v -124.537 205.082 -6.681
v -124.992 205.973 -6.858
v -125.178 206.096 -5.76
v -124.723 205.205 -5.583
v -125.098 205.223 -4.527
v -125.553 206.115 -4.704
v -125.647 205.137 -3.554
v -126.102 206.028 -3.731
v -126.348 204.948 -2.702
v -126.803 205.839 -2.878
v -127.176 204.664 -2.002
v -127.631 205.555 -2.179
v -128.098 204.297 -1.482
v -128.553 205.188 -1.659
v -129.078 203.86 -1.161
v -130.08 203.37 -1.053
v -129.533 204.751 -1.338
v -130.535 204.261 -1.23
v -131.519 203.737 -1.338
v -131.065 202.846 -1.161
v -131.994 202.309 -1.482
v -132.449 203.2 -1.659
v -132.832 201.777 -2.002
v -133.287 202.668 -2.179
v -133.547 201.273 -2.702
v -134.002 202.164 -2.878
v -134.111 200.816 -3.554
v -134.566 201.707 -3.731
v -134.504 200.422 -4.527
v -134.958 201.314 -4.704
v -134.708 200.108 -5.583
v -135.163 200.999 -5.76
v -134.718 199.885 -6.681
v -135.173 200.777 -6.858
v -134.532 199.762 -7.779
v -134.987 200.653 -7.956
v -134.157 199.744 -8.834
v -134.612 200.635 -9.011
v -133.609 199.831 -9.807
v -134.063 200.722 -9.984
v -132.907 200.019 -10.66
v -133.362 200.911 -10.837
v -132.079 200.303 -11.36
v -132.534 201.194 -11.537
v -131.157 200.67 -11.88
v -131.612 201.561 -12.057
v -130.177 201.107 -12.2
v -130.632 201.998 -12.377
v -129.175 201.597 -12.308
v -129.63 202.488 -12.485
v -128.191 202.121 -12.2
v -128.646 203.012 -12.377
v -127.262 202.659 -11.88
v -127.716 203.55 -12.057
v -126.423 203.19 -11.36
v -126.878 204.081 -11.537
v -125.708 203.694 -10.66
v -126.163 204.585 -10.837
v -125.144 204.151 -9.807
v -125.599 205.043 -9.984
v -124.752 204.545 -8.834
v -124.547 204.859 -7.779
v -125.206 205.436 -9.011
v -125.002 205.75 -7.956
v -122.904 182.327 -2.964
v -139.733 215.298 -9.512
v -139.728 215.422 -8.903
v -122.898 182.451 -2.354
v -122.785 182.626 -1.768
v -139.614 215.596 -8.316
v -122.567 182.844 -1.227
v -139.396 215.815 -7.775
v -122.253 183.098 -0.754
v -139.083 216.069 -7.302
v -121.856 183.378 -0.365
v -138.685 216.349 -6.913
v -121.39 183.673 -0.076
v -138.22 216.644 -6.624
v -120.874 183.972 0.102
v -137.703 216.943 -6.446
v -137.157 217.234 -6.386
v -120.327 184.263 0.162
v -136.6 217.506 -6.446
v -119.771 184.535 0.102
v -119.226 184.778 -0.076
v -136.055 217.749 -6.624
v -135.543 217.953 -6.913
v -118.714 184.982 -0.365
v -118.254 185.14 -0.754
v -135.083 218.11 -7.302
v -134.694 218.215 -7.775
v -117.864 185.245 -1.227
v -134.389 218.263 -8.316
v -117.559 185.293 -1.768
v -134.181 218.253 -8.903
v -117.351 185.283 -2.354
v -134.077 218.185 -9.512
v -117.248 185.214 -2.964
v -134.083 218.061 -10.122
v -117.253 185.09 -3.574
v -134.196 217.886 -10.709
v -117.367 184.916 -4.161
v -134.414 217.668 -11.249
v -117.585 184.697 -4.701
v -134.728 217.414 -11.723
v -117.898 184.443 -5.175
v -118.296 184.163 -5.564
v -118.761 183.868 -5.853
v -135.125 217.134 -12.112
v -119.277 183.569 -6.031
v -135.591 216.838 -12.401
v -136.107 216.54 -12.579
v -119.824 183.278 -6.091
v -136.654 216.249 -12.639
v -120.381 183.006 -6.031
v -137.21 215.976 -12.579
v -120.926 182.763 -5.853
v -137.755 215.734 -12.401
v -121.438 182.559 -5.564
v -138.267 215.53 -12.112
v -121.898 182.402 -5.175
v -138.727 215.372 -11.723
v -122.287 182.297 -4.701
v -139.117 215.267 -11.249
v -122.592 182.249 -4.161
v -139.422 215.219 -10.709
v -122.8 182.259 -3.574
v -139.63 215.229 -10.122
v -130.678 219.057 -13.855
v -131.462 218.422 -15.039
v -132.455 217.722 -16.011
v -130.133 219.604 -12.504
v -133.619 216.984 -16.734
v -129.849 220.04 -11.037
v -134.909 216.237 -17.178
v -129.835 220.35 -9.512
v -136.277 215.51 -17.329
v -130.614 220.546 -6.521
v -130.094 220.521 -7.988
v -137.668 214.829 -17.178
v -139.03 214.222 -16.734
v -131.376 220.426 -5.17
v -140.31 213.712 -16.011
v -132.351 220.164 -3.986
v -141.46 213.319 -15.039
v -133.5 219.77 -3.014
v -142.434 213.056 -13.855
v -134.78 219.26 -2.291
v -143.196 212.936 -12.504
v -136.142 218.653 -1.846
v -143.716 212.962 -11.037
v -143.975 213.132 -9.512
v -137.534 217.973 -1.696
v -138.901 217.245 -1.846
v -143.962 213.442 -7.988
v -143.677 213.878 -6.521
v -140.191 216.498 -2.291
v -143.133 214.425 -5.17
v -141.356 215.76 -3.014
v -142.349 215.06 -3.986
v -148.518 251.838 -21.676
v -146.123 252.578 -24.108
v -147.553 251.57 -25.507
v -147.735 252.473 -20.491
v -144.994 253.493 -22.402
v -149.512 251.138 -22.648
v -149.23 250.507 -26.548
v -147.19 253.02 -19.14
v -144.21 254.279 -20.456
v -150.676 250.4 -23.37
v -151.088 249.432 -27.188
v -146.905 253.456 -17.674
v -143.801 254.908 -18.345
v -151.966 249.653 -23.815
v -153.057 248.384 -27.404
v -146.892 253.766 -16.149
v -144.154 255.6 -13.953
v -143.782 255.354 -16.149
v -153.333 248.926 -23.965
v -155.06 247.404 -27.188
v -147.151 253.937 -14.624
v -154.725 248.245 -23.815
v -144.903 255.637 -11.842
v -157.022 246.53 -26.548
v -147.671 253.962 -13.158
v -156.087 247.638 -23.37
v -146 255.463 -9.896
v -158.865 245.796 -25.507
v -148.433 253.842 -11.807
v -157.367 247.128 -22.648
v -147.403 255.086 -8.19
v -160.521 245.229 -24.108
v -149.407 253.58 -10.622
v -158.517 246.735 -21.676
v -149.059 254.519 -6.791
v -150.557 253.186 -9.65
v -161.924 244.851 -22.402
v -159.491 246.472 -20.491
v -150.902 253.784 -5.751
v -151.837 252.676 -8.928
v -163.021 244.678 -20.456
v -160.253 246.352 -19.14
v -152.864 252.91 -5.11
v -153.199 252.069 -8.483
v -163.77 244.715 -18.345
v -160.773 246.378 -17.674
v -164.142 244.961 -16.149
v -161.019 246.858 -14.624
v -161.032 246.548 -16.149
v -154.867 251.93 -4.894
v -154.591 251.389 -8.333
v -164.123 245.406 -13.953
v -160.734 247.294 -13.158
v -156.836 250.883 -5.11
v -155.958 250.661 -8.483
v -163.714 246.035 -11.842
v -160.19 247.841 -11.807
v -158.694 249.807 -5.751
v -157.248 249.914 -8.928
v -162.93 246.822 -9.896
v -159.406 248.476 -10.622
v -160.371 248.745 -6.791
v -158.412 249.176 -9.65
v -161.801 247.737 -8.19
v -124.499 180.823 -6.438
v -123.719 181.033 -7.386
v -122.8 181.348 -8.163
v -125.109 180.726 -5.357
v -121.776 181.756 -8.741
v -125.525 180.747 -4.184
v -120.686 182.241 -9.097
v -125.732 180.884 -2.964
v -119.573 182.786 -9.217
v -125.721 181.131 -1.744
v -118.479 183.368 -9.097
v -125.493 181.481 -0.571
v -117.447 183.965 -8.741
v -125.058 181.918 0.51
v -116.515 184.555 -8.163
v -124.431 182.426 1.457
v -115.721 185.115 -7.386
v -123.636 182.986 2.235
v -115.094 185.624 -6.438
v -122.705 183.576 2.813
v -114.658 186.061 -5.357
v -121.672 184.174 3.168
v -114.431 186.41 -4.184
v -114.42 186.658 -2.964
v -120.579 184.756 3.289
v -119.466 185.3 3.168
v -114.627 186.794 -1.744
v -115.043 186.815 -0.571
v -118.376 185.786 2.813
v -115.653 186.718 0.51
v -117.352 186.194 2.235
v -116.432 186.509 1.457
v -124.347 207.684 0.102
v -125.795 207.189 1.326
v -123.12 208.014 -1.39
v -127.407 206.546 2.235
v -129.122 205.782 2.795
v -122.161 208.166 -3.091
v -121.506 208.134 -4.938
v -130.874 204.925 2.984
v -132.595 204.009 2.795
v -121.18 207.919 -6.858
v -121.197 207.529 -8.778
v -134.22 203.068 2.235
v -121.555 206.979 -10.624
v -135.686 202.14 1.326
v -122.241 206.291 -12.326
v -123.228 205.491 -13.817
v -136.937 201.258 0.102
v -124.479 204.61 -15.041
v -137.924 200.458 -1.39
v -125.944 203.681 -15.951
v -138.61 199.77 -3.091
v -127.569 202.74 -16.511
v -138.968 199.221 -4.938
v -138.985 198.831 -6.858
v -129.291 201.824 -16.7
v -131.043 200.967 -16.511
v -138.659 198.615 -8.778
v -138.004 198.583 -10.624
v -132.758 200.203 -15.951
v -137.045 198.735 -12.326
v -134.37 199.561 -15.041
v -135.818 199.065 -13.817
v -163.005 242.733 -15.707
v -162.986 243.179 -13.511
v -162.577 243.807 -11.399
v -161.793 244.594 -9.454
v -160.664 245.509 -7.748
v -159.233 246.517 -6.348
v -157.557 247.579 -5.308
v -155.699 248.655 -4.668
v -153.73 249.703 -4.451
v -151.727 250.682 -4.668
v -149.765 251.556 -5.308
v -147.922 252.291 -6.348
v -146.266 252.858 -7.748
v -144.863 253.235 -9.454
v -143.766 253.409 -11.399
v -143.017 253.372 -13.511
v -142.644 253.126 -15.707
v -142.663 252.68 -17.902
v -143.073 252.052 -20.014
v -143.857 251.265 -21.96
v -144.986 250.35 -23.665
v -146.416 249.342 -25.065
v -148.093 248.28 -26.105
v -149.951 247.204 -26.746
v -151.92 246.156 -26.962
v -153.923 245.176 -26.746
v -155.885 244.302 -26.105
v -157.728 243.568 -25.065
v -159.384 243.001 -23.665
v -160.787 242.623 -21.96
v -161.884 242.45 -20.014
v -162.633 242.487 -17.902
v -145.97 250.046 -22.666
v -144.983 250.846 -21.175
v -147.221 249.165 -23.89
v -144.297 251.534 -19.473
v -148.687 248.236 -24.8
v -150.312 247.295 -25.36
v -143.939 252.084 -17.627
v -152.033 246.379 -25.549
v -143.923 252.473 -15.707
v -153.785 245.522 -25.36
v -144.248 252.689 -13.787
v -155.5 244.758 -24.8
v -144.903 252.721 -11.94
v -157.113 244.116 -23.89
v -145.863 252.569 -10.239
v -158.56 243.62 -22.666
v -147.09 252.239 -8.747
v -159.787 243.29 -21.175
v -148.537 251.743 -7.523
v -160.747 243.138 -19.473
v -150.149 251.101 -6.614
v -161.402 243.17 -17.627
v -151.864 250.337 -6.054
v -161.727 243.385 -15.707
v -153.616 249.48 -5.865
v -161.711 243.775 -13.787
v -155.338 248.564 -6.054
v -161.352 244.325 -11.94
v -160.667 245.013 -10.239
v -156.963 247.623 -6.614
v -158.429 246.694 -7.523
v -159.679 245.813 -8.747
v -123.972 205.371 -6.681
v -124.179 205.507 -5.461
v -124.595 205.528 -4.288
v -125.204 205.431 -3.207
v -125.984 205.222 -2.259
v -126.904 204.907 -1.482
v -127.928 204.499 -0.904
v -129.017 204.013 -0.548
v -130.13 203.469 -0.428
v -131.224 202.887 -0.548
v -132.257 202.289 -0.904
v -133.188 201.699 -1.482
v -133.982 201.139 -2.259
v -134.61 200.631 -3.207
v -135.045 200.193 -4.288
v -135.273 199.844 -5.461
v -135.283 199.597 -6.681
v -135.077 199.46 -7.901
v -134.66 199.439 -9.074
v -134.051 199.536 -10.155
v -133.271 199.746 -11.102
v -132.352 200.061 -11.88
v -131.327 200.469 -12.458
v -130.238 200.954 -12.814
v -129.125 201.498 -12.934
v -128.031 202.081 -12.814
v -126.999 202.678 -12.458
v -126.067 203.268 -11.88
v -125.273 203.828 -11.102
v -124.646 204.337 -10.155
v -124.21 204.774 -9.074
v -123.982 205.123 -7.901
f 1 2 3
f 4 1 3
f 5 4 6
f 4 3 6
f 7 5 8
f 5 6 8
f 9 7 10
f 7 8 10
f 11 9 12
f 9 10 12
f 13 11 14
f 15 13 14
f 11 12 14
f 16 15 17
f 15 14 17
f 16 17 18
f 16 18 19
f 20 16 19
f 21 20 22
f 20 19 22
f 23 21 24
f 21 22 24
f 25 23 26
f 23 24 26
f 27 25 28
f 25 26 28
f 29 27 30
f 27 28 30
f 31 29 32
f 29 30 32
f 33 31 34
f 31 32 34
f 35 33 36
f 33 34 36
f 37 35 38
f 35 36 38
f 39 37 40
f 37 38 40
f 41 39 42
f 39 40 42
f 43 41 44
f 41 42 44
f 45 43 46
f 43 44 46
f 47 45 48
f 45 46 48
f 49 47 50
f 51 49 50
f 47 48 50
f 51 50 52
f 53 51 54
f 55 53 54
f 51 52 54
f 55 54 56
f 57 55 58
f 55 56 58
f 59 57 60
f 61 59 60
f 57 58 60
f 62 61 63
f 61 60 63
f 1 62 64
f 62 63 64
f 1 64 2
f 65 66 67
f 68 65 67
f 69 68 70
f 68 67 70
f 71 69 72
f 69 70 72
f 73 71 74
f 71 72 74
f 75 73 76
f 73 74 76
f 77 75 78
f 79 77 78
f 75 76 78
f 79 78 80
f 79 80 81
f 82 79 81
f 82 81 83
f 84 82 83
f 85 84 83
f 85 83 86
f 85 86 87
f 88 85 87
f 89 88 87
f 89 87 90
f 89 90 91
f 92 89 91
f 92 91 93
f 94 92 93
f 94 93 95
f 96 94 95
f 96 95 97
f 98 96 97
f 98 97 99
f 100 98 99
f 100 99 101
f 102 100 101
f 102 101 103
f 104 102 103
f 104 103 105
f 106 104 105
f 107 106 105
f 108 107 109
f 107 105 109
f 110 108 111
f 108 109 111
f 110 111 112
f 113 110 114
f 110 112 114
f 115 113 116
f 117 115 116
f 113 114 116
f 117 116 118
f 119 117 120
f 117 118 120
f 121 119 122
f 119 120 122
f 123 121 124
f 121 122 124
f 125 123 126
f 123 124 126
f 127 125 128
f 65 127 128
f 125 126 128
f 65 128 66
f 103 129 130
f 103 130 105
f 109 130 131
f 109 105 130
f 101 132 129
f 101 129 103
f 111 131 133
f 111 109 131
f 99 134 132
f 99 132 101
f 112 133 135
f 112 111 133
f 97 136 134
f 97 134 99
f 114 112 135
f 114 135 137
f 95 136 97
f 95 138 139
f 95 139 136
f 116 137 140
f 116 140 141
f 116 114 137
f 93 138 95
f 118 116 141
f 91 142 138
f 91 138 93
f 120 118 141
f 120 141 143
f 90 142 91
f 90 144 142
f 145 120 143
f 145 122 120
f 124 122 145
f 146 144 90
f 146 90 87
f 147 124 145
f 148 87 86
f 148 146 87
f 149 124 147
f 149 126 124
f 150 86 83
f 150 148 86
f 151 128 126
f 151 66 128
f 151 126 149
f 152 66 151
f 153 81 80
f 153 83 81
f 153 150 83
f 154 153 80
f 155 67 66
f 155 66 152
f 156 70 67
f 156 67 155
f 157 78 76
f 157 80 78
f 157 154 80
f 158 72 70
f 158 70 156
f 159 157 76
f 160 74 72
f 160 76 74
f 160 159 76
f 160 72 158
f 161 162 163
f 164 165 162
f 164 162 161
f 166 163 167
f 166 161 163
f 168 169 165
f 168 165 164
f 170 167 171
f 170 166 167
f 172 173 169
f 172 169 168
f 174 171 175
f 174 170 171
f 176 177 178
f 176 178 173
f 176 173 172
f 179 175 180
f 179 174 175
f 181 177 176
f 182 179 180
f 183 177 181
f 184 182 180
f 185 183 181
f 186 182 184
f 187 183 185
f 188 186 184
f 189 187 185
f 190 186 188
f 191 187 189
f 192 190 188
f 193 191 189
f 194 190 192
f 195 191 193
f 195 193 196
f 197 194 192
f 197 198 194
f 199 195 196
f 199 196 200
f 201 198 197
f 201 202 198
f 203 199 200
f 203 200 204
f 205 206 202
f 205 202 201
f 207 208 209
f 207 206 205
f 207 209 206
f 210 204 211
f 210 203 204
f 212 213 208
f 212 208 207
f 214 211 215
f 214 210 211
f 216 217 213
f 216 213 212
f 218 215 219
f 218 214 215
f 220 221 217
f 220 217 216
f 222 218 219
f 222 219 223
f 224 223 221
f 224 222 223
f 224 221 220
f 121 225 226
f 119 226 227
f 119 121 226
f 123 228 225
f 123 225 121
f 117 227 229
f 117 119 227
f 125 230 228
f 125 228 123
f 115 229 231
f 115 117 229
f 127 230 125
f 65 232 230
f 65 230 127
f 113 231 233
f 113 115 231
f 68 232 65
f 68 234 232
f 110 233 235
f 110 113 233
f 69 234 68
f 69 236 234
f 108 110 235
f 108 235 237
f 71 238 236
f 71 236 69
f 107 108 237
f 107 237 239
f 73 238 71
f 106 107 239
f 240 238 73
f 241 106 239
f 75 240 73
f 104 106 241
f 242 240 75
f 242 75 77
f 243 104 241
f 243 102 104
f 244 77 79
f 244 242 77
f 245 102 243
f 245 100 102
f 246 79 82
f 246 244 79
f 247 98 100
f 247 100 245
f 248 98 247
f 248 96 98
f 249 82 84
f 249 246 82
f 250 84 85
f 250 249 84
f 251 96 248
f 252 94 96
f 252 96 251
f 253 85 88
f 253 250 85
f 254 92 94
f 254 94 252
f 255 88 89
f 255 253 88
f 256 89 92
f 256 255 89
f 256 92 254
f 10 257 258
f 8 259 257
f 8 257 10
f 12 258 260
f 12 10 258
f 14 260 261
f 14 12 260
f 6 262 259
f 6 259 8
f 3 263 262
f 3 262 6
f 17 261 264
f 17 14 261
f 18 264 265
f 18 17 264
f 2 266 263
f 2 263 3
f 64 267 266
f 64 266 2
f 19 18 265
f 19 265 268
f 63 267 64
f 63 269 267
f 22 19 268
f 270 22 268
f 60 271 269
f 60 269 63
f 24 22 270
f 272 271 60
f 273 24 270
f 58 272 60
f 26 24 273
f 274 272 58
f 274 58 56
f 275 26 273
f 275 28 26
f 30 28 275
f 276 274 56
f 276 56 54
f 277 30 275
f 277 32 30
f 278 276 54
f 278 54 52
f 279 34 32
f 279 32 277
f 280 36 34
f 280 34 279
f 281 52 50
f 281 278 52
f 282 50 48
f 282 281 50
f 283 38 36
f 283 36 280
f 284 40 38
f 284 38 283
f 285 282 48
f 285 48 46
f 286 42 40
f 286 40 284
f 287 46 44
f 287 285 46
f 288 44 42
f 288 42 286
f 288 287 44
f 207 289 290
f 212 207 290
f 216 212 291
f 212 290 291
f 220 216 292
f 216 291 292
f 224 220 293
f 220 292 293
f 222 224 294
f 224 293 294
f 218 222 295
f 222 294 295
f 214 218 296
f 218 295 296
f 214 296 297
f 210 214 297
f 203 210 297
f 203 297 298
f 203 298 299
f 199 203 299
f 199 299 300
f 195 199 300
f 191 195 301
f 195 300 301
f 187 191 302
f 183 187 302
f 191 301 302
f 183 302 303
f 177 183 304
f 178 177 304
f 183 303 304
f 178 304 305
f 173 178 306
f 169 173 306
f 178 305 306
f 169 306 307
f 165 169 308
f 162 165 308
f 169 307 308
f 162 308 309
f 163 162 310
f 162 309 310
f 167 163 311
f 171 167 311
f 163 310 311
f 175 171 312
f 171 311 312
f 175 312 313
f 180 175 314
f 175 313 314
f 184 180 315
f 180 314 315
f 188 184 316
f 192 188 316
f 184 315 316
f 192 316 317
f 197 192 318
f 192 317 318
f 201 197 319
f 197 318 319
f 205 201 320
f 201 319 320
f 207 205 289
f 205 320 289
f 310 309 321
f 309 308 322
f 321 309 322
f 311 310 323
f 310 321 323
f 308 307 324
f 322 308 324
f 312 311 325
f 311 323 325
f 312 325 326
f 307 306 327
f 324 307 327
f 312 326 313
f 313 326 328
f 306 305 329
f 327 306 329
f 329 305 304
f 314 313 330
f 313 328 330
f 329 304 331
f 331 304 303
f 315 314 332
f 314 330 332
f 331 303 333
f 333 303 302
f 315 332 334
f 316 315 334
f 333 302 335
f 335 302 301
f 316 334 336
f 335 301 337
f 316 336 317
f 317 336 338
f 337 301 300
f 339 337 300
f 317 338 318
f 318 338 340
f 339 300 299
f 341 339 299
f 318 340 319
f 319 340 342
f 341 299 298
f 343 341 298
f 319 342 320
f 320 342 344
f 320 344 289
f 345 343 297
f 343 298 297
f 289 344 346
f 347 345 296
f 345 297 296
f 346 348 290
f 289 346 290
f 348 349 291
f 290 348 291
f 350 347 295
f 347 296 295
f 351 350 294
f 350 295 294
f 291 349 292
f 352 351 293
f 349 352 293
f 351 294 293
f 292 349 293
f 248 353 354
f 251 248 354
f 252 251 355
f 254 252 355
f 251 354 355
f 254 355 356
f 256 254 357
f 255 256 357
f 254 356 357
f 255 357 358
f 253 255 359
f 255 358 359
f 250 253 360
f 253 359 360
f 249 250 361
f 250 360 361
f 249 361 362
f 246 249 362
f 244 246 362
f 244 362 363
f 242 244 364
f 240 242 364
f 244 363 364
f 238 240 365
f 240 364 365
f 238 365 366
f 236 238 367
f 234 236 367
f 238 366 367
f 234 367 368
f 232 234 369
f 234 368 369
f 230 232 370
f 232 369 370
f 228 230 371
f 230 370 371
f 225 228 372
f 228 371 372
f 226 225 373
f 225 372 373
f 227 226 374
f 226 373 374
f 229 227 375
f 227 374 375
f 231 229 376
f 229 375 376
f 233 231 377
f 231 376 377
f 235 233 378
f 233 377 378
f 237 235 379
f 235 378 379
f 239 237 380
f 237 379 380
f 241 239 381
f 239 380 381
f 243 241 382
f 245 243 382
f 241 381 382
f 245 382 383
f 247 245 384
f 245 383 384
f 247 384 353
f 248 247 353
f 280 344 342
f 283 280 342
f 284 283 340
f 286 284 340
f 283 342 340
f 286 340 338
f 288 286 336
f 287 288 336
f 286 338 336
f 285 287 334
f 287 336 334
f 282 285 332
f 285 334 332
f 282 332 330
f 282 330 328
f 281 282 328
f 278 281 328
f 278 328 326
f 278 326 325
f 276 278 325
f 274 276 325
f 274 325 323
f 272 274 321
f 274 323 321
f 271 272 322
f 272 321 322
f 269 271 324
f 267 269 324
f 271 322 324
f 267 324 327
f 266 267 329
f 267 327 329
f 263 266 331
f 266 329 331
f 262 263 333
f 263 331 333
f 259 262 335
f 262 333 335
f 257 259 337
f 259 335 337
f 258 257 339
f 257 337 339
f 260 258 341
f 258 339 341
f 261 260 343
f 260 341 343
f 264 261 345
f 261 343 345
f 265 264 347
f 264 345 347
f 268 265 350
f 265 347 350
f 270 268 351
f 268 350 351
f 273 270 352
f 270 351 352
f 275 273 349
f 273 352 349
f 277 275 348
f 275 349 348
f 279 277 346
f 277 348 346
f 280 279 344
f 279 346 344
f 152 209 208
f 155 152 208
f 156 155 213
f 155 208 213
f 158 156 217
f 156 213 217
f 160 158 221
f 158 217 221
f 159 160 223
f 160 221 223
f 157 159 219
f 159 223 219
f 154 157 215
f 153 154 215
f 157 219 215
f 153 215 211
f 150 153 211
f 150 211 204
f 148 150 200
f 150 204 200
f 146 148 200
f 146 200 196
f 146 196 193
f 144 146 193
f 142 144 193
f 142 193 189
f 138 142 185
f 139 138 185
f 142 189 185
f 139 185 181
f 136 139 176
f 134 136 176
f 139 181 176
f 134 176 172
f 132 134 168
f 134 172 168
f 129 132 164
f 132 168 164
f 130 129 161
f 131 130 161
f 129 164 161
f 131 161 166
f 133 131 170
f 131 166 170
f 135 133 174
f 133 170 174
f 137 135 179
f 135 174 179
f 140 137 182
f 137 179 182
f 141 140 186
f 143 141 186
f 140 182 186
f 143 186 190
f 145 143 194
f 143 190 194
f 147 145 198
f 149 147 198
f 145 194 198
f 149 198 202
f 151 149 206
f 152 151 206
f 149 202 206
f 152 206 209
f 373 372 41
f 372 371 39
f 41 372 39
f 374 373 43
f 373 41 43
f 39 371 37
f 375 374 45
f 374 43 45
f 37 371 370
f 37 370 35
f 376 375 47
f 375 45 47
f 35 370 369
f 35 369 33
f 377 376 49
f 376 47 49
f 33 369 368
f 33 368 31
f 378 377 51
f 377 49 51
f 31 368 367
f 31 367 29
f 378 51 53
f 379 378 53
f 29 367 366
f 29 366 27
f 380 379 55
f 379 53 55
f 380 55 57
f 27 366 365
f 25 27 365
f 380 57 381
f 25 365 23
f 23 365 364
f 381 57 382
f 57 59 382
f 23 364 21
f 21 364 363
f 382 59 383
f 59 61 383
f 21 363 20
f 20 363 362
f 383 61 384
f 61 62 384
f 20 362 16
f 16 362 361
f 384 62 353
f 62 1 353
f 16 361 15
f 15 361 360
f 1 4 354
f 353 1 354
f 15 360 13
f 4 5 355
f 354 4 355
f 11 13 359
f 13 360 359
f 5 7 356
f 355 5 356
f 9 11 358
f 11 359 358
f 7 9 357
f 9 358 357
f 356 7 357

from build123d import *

# Parameters (mm, degrees)
SKETCH1_R           = 11.43
BOSS_EXTRUDE1_DEPTH = 2.54
SKETCH2_R           = 9.9949
BOSS_EXTRUDE2_DEPTH = 50.8
SKETCH3_R           = 5.715
BOSS_EXTRUDE3_DEPTH = 1.016
SKETCH4_R           = 6.35
BOSS_EXTRUDE4_DEPTH = 21.336
SKETCH5_R           = 3.175
CUT_EXTRUDE1_DEPTH  = 99.13815411
SKETCH6_R           = 7.9375
CUT_EXTRUDE2_DEPTH  = 38.1


with BuildPart() as part:
    # Sketch1 → Boss-Extrude1 (new body)
    with BuildSketch(Plane(origin=(-129.203450499, 253.122013832, -50.271342949), x_dir=(0.8839119577418659, 0.40461078724322996, -0.23449895907520743), z_dir=(-0.4476862825736014, 0.8770605813697528, -0.1741887740435096))):
        with Locations(Location((-31.085661697, -28.519102589, 0), (0, 0, 166.223237714))):
            Circle(SKETCH1_R)
    extrude(amount=BOSS_EXTRUDE1_DEPTH)

    # Sketch2 → Boss-Extrude2 (add)
    with BuildSketch(Plane(origin=(-129.203450499, 253.122013832, -50.271342949), x_dir=(-0.8839119577418658, -0.4046107872432301, 0.23449895907520704), z_dir=(0.44768628257360144, -0.8770605813697528, 0.17418877404350955))):
        with Locations(Location((31.085661697, -28.519102589, 0), (0, 0, 13.776762286))):
            Circle(SKETCH2_R)
    extrude(amount=BOSS_EXTRUDE2_DEPTH)

    # Sketch3 → Boss-Extrude3 (add)
    with BuildSketch(Plane(origin=(-106.460987345, 208.567336298, -41.422553227), x_dir=(-0.8839119577418658, -0.40461078724323, 0.2344989590752073), z_dir=(0.44768628257360144, -0.8770605813697528, 0.17418877404350946))):
        with Locations(Location((31.085661697, -28.519102589, 0), (0, 0, 193.776762286))):
            Circle(SKETCH3_R)
    extrude(amount=BOSS_EXTRUDE3_DEPTH)

    # Sketch4 → Boss-Extrude4 (add)
    with BuildSketch(Plane(origin=(-106.006138081, 207.676242747, -41.245577433), x_dir=(-0.8839119577418657, -0.40461078724322985, 0.23449895907520799), z_dir=(0.4476862825736014, -0.8770605813697527, 0.1741887740435095))):
        with Locations(Location((31.085661697, -28.519102589, 0), (0, 0, 193.776762286))):
            Circle(SKETCH4_R)
    extrude(amount=BOSS_EXTRUDE4_DEPTH)

    # Sketch5 → Cut-Extrude1 (cut, through all)
    with BuildSketch(Plane(origin=(-130.340573657, 255.349747708, -50.713782435), x_dir=(0.8839119577418658, 0.40461078724323, -0.2344989590752073), z_dir=(-0.4476862825736014, 0.8770605813697528, -0.1741887740435095))):
        with Locations(Location((-31.085661697, -28.519102589, 0), (0, 0, 166.223237714))):
            Circle(SKETCH5_R)
    extrude(amount=-CUT_EXTRUDE1_DEPTH, mode=Mode.SUBTRACT)

    # Sketch6 → Cut-Extrude2 (cut)
    with BuildSketch(Plane(origin=(-130.340573657, 255.349747708, -50.713782435), x_dir=(0.8839119577418658, 0.40461078724323, -0.2344989590752073), z_dir=(-0.4476862825736014, 0.8770605813697528, -0.1741887740435095))):
        with Locations(Location((-31.085661697, -28.519102589, 0), (0, 0, 166.223237714))):
            Circle(SKETCH6_R)
    extrude(amount=-CUT_EXTRUDE2_DEPTH, mode=Mode.SUBTRACT)


solid = part.part
